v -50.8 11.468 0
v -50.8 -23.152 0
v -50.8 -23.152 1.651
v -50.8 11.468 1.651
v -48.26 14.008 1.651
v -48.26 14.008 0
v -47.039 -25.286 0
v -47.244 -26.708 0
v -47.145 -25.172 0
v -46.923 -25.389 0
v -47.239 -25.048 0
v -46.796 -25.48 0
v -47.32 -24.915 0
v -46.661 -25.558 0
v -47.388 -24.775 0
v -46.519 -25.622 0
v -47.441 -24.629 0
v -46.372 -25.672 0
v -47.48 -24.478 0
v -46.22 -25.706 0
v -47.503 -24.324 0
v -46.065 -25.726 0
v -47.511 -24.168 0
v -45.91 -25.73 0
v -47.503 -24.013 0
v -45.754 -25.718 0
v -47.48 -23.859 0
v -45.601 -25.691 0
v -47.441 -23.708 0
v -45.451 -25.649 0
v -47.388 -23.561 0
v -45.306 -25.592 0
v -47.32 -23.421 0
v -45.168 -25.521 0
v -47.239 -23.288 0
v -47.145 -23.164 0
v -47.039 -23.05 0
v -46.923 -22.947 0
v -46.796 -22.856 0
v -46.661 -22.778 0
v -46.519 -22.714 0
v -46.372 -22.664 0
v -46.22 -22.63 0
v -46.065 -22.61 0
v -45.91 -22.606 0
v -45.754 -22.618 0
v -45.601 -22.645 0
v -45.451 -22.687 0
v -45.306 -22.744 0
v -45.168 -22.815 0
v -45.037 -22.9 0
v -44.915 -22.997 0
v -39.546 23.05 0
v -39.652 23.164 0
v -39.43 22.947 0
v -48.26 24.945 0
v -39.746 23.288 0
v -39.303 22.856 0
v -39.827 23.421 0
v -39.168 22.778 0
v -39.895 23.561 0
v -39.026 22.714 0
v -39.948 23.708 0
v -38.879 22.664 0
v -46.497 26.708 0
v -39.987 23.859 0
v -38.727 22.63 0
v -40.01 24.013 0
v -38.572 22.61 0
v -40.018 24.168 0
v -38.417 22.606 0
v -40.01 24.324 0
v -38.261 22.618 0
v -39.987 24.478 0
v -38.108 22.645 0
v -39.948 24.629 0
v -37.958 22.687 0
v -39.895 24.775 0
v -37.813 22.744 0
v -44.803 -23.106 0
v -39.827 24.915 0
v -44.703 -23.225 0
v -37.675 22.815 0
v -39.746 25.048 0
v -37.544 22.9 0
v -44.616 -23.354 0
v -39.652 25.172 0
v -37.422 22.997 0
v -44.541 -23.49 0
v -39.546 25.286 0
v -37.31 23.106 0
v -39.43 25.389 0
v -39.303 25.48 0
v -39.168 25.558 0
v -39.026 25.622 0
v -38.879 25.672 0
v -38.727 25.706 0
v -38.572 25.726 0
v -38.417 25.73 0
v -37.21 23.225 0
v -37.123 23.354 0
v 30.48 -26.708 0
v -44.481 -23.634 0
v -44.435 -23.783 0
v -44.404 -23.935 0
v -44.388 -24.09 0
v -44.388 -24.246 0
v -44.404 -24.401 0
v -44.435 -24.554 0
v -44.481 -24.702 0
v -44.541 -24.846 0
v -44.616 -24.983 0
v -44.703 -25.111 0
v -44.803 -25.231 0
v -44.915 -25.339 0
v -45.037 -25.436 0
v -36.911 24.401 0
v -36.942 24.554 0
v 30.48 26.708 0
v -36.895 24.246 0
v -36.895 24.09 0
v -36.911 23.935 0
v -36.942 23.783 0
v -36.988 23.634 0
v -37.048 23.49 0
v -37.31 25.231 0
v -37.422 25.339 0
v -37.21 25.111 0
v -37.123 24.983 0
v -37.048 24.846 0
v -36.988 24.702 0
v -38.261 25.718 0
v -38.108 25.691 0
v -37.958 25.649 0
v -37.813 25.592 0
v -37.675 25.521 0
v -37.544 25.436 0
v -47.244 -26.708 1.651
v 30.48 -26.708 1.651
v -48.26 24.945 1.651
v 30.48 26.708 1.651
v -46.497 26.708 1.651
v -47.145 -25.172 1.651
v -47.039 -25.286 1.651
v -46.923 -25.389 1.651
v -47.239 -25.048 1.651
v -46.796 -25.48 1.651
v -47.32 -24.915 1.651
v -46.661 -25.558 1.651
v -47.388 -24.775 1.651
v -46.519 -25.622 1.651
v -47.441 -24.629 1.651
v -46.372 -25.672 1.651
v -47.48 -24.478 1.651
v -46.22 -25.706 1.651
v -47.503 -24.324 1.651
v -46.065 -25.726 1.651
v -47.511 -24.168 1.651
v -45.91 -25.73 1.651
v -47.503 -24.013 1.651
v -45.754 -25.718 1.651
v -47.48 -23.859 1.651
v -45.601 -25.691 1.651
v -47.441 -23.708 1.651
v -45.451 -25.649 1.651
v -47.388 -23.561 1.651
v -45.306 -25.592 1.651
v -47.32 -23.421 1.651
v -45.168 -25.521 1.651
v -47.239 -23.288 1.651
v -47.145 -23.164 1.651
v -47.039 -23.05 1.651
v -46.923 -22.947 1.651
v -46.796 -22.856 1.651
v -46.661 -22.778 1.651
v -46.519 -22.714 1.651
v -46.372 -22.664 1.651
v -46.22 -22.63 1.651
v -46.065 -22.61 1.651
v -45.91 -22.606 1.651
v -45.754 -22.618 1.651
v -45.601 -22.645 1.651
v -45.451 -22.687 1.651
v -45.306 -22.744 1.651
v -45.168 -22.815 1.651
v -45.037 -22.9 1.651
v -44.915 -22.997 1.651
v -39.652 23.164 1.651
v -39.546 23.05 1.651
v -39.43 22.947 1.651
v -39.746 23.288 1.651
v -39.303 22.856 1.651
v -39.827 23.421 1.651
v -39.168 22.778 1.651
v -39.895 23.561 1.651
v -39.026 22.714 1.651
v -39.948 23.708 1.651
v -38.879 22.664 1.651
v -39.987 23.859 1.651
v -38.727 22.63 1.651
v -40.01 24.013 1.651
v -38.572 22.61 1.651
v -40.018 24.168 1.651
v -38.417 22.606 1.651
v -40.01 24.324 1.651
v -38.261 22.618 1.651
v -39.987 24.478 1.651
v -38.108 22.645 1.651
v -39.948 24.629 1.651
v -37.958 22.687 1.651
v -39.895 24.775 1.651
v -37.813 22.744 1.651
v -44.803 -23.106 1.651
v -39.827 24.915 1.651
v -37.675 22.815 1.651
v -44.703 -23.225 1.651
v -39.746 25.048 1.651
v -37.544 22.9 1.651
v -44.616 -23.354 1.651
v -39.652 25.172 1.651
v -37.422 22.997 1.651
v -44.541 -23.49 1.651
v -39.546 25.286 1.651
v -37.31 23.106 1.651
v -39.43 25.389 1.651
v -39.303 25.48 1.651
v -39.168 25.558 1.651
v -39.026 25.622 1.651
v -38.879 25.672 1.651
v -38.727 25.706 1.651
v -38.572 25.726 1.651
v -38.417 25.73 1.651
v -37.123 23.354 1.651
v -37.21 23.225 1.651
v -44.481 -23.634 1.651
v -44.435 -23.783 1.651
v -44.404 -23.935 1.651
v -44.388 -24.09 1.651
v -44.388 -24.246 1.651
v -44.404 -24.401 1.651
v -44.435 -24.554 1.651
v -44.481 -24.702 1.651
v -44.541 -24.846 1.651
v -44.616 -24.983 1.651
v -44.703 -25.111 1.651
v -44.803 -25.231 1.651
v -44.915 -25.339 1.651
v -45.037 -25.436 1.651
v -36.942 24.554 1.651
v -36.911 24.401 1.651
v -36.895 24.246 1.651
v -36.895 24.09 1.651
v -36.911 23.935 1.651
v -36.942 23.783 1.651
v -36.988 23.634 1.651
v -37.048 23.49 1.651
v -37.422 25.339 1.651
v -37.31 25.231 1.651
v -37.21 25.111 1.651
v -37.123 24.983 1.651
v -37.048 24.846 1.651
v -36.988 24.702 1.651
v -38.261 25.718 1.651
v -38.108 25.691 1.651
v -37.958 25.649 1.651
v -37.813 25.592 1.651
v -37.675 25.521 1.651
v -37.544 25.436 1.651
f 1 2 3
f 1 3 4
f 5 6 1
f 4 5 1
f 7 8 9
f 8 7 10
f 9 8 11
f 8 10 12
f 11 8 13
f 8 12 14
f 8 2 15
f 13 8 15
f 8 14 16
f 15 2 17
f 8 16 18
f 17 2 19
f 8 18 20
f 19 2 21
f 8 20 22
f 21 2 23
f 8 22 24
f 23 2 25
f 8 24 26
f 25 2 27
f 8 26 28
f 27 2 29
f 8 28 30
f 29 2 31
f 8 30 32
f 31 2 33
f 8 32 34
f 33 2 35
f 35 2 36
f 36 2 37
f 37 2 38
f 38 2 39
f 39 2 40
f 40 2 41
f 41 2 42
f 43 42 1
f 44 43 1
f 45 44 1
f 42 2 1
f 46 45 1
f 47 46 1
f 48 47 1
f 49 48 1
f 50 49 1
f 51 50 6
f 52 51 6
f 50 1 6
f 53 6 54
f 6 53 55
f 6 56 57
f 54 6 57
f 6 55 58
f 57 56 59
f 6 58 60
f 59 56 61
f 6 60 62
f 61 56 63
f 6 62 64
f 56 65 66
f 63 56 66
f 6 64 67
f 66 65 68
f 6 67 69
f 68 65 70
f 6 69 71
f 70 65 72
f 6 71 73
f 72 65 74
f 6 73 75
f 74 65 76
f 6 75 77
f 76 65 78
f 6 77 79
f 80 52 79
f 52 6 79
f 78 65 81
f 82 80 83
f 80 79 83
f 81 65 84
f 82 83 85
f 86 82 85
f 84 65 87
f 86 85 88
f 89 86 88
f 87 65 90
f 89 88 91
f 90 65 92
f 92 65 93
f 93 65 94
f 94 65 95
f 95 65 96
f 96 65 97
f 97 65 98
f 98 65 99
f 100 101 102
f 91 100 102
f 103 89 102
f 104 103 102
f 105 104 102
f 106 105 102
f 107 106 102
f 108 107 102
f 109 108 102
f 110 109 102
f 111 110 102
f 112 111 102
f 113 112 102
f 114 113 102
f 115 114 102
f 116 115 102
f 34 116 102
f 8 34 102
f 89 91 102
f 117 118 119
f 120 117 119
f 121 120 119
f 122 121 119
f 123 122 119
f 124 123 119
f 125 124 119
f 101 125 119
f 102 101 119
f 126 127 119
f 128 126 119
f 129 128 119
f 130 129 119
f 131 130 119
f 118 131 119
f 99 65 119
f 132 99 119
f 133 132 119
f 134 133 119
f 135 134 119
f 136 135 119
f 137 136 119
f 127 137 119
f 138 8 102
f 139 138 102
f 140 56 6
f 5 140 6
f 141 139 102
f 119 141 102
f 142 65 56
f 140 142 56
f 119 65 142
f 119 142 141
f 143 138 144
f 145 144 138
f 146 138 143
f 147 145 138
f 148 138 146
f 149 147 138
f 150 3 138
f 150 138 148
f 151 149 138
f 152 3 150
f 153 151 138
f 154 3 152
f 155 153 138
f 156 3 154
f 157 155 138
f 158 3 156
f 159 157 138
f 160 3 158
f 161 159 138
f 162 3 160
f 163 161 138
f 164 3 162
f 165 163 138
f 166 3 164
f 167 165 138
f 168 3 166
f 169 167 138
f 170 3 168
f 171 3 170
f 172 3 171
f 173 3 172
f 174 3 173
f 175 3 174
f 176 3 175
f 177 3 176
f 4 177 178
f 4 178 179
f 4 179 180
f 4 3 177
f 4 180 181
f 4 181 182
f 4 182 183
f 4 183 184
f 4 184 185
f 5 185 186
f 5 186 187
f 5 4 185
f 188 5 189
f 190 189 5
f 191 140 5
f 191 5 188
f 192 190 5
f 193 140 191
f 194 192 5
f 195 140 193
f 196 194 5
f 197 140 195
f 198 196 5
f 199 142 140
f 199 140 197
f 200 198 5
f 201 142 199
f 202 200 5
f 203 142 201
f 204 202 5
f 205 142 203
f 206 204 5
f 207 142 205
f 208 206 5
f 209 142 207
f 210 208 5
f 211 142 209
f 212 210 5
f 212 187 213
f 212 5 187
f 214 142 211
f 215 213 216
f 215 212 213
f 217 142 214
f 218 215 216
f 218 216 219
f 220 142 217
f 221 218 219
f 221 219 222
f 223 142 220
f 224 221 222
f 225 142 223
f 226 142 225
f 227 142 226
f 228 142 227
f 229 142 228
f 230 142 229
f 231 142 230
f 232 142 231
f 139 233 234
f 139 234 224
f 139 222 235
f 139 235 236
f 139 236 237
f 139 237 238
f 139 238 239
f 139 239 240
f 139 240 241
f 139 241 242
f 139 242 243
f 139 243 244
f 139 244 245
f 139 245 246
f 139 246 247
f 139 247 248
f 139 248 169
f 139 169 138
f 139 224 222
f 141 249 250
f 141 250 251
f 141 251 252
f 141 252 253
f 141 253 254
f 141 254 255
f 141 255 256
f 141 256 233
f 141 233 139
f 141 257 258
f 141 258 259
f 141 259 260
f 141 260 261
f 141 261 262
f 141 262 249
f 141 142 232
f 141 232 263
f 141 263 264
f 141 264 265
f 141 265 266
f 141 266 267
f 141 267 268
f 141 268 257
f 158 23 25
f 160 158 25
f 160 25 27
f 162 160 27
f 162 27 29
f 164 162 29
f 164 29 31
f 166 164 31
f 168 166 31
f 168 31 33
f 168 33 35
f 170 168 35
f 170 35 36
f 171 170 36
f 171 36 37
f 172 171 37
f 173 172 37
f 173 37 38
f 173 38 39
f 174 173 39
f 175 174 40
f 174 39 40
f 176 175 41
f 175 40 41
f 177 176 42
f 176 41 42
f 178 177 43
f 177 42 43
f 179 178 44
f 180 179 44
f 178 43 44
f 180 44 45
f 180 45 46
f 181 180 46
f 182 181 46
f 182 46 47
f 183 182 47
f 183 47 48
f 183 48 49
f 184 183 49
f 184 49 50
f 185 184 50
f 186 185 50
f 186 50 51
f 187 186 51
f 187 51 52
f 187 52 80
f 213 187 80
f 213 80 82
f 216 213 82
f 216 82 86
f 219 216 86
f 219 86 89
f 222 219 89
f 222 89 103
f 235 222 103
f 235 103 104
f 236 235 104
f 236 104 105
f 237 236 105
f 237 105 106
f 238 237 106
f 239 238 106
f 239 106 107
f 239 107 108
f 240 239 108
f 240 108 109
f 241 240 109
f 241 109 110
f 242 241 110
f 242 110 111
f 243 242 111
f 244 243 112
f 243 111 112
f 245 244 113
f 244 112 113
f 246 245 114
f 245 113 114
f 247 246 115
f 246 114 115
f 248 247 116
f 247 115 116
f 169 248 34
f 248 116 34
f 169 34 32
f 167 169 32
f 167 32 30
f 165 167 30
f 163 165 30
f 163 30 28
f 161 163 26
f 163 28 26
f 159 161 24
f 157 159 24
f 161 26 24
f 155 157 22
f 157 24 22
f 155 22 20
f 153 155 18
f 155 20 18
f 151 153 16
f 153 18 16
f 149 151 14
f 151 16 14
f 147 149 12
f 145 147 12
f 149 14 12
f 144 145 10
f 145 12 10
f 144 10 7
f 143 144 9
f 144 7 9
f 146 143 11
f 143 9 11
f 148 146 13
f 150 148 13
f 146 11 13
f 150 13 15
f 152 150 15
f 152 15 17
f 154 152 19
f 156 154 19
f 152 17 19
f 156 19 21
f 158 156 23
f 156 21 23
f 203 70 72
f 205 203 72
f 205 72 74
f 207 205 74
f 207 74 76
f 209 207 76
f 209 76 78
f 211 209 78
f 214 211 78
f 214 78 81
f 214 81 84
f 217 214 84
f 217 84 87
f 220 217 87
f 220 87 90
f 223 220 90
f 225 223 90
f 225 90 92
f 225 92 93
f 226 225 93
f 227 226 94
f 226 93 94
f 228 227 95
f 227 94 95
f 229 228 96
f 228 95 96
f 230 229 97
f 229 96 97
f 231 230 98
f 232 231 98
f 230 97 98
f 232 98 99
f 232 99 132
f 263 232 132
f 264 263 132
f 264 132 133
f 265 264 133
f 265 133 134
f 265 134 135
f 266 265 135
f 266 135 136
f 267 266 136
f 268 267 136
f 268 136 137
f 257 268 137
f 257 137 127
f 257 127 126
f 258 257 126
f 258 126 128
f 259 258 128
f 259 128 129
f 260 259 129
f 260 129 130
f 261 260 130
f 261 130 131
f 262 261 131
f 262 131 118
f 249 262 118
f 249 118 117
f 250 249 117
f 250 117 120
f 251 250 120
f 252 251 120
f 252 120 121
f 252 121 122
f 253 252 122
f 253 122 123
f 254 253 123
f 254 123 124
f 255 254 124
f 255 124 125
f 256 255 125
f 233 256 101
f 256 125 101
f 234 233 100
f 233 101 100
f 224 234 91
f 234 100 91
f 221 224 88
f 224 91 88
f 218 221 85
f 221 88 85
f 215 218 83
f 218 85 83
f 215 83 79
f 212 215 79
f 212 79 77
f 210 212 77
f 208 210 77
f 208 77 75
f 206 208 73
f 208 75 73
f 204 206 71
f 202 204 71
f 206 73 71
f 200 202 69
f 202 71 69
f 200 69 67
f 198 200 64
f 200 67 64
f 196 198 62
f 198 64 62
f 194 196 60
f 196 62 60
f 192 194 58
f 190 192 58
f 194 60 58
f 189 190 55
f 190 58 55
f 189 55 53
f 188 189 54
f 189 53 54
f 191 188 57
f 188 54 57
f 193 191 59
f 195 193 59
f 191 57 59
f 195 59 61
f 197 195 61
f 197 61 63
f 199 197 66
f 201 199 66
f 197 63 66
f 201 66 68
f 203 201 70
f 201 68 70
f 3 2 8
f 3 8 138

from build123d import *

# Parameters (mm, degrees)
SKETCH1_W               = 101.6
SKETCH1_H               = 53.4162
BOSS_EXTRUDE1_DEPTH     = 1.651
CHAMFER3_SIZE           = 3.556
CUT_EXTRUDE4_REACH      = 3.651
CUT_EXTRUDE5_REACH      = 3.651
SKETCH22_R              = 1.5621
ESQUISSE1_W             = 1.651
ESQUISSE1_H             = 53.4162
ENL_V_MAT_EXTRU_1_DEPTH = 20.32


with BuildPart() as part:
    # Sketch1 → Boss-Extrude1 (new body)
    with BuildSketch(Plane.XY):
        Rectangle(SKETCH1_W, SKETCH1_H)
    extrude(amount=BOSS_EXTRUDE1_DEPTH)

    # Chamfer3
    chamfer3_edges = [part.edges().sort_by_distance(p)[0] for p in [
        (-50.8, -26.7081, 0.8255),
    ]]
    chamfer(chamfer3_edges, length=CHAMFER3_SIZE)

    # Sketch13 → Cut-Extrude4 (cut, up to next)
    with BuildSketch(Plane(origin=(0, 0, 0), x_dir=(-1, 0, 0), z_dir=(0, 0, -1)), mode=Mode.PRIVATE) as cut_extrude4_sk1:
        Polygon((48.26, 24.9446647), (48.26, 14.0081), (50.8, 11.4681), (50.8, 26.7081), (46.4965647, 26.7081), align=None)
    cut_extrude4_tool1 = extrude(cut_extrude4_sk1.sketch, amount=-CUT_EXTRUDE4_REACH, mode=Mode.PRIVATE) & part.part
    add(cut_extrude4_tool1.solids().sort_by_distance((-49.48888, 19.973214, 0))[0], mode=Mode.SUBTRACT)

    # Sketch22 → Cut-Extrude5 (cut, up to next)
    with BuildSketch(Plane(origin=(0, 0, 0), x_dir=(-1, 0, 0), z_dir=(0, 0, -1)), mode=Mode.PRIVATE) as cut_extrude5_sk1:
        with Locations((38.4556, 24.1681)):
            Circle(SKETCH22_R)
    cut_extrude5_tool1 = extrude(cut_extrude5_sk1.sketch, amount=-CUT_EXTRUDE5_REACH, mode=Mode.PRIVATE) & part.part
    add(cut_extrude5_tool1.solids().sort_by_distance((-38.4556, 24.1681, 0))[0], mode=Mode.SUBTRACT)
    # Sketch22 → Cut-Extrude5 (cut, up to next)
    with BuildSketch(Plane(origin=(0, 0, 0), x_dir=(-1, 0, 0), z_dir=(0, 0, -1)), mode=Mode.PRIVATE) as cut_extrude5_sk2:
        with Locations((45.9486, -24.1681)):
            Circle(SKETCH22_R)
    cut_extrude5_tool2 = extrude(cut_extrude5_sk2.sketch, amount=-CUT_EXTRUDE5_REACH, mode=Mode.PRIVATE) & part.part
    add(cut_extrude5_tool2.solids().sort_by_distance((-45.9486, -24.1681, 0))[0], mode=Mode.SUBTRACT)

    # Esquisse1 → Enlèv. mat.-Extru.1 (cut)
    with BuildSketch(Plane(origin=(50.8, 0, 0), x_dir=(0, 0, -1), z_dir=(1, 0, 0))):
        with Locations((-0.8255, 0)):
            Rectangle(ESQUISSE1_W, ESQUISSE1_H)
    extrude(amount=-ENL_V_MAT_EXTRU_1_DEPTH, mode=Mode.SUBTRACT)


solid = part.part
